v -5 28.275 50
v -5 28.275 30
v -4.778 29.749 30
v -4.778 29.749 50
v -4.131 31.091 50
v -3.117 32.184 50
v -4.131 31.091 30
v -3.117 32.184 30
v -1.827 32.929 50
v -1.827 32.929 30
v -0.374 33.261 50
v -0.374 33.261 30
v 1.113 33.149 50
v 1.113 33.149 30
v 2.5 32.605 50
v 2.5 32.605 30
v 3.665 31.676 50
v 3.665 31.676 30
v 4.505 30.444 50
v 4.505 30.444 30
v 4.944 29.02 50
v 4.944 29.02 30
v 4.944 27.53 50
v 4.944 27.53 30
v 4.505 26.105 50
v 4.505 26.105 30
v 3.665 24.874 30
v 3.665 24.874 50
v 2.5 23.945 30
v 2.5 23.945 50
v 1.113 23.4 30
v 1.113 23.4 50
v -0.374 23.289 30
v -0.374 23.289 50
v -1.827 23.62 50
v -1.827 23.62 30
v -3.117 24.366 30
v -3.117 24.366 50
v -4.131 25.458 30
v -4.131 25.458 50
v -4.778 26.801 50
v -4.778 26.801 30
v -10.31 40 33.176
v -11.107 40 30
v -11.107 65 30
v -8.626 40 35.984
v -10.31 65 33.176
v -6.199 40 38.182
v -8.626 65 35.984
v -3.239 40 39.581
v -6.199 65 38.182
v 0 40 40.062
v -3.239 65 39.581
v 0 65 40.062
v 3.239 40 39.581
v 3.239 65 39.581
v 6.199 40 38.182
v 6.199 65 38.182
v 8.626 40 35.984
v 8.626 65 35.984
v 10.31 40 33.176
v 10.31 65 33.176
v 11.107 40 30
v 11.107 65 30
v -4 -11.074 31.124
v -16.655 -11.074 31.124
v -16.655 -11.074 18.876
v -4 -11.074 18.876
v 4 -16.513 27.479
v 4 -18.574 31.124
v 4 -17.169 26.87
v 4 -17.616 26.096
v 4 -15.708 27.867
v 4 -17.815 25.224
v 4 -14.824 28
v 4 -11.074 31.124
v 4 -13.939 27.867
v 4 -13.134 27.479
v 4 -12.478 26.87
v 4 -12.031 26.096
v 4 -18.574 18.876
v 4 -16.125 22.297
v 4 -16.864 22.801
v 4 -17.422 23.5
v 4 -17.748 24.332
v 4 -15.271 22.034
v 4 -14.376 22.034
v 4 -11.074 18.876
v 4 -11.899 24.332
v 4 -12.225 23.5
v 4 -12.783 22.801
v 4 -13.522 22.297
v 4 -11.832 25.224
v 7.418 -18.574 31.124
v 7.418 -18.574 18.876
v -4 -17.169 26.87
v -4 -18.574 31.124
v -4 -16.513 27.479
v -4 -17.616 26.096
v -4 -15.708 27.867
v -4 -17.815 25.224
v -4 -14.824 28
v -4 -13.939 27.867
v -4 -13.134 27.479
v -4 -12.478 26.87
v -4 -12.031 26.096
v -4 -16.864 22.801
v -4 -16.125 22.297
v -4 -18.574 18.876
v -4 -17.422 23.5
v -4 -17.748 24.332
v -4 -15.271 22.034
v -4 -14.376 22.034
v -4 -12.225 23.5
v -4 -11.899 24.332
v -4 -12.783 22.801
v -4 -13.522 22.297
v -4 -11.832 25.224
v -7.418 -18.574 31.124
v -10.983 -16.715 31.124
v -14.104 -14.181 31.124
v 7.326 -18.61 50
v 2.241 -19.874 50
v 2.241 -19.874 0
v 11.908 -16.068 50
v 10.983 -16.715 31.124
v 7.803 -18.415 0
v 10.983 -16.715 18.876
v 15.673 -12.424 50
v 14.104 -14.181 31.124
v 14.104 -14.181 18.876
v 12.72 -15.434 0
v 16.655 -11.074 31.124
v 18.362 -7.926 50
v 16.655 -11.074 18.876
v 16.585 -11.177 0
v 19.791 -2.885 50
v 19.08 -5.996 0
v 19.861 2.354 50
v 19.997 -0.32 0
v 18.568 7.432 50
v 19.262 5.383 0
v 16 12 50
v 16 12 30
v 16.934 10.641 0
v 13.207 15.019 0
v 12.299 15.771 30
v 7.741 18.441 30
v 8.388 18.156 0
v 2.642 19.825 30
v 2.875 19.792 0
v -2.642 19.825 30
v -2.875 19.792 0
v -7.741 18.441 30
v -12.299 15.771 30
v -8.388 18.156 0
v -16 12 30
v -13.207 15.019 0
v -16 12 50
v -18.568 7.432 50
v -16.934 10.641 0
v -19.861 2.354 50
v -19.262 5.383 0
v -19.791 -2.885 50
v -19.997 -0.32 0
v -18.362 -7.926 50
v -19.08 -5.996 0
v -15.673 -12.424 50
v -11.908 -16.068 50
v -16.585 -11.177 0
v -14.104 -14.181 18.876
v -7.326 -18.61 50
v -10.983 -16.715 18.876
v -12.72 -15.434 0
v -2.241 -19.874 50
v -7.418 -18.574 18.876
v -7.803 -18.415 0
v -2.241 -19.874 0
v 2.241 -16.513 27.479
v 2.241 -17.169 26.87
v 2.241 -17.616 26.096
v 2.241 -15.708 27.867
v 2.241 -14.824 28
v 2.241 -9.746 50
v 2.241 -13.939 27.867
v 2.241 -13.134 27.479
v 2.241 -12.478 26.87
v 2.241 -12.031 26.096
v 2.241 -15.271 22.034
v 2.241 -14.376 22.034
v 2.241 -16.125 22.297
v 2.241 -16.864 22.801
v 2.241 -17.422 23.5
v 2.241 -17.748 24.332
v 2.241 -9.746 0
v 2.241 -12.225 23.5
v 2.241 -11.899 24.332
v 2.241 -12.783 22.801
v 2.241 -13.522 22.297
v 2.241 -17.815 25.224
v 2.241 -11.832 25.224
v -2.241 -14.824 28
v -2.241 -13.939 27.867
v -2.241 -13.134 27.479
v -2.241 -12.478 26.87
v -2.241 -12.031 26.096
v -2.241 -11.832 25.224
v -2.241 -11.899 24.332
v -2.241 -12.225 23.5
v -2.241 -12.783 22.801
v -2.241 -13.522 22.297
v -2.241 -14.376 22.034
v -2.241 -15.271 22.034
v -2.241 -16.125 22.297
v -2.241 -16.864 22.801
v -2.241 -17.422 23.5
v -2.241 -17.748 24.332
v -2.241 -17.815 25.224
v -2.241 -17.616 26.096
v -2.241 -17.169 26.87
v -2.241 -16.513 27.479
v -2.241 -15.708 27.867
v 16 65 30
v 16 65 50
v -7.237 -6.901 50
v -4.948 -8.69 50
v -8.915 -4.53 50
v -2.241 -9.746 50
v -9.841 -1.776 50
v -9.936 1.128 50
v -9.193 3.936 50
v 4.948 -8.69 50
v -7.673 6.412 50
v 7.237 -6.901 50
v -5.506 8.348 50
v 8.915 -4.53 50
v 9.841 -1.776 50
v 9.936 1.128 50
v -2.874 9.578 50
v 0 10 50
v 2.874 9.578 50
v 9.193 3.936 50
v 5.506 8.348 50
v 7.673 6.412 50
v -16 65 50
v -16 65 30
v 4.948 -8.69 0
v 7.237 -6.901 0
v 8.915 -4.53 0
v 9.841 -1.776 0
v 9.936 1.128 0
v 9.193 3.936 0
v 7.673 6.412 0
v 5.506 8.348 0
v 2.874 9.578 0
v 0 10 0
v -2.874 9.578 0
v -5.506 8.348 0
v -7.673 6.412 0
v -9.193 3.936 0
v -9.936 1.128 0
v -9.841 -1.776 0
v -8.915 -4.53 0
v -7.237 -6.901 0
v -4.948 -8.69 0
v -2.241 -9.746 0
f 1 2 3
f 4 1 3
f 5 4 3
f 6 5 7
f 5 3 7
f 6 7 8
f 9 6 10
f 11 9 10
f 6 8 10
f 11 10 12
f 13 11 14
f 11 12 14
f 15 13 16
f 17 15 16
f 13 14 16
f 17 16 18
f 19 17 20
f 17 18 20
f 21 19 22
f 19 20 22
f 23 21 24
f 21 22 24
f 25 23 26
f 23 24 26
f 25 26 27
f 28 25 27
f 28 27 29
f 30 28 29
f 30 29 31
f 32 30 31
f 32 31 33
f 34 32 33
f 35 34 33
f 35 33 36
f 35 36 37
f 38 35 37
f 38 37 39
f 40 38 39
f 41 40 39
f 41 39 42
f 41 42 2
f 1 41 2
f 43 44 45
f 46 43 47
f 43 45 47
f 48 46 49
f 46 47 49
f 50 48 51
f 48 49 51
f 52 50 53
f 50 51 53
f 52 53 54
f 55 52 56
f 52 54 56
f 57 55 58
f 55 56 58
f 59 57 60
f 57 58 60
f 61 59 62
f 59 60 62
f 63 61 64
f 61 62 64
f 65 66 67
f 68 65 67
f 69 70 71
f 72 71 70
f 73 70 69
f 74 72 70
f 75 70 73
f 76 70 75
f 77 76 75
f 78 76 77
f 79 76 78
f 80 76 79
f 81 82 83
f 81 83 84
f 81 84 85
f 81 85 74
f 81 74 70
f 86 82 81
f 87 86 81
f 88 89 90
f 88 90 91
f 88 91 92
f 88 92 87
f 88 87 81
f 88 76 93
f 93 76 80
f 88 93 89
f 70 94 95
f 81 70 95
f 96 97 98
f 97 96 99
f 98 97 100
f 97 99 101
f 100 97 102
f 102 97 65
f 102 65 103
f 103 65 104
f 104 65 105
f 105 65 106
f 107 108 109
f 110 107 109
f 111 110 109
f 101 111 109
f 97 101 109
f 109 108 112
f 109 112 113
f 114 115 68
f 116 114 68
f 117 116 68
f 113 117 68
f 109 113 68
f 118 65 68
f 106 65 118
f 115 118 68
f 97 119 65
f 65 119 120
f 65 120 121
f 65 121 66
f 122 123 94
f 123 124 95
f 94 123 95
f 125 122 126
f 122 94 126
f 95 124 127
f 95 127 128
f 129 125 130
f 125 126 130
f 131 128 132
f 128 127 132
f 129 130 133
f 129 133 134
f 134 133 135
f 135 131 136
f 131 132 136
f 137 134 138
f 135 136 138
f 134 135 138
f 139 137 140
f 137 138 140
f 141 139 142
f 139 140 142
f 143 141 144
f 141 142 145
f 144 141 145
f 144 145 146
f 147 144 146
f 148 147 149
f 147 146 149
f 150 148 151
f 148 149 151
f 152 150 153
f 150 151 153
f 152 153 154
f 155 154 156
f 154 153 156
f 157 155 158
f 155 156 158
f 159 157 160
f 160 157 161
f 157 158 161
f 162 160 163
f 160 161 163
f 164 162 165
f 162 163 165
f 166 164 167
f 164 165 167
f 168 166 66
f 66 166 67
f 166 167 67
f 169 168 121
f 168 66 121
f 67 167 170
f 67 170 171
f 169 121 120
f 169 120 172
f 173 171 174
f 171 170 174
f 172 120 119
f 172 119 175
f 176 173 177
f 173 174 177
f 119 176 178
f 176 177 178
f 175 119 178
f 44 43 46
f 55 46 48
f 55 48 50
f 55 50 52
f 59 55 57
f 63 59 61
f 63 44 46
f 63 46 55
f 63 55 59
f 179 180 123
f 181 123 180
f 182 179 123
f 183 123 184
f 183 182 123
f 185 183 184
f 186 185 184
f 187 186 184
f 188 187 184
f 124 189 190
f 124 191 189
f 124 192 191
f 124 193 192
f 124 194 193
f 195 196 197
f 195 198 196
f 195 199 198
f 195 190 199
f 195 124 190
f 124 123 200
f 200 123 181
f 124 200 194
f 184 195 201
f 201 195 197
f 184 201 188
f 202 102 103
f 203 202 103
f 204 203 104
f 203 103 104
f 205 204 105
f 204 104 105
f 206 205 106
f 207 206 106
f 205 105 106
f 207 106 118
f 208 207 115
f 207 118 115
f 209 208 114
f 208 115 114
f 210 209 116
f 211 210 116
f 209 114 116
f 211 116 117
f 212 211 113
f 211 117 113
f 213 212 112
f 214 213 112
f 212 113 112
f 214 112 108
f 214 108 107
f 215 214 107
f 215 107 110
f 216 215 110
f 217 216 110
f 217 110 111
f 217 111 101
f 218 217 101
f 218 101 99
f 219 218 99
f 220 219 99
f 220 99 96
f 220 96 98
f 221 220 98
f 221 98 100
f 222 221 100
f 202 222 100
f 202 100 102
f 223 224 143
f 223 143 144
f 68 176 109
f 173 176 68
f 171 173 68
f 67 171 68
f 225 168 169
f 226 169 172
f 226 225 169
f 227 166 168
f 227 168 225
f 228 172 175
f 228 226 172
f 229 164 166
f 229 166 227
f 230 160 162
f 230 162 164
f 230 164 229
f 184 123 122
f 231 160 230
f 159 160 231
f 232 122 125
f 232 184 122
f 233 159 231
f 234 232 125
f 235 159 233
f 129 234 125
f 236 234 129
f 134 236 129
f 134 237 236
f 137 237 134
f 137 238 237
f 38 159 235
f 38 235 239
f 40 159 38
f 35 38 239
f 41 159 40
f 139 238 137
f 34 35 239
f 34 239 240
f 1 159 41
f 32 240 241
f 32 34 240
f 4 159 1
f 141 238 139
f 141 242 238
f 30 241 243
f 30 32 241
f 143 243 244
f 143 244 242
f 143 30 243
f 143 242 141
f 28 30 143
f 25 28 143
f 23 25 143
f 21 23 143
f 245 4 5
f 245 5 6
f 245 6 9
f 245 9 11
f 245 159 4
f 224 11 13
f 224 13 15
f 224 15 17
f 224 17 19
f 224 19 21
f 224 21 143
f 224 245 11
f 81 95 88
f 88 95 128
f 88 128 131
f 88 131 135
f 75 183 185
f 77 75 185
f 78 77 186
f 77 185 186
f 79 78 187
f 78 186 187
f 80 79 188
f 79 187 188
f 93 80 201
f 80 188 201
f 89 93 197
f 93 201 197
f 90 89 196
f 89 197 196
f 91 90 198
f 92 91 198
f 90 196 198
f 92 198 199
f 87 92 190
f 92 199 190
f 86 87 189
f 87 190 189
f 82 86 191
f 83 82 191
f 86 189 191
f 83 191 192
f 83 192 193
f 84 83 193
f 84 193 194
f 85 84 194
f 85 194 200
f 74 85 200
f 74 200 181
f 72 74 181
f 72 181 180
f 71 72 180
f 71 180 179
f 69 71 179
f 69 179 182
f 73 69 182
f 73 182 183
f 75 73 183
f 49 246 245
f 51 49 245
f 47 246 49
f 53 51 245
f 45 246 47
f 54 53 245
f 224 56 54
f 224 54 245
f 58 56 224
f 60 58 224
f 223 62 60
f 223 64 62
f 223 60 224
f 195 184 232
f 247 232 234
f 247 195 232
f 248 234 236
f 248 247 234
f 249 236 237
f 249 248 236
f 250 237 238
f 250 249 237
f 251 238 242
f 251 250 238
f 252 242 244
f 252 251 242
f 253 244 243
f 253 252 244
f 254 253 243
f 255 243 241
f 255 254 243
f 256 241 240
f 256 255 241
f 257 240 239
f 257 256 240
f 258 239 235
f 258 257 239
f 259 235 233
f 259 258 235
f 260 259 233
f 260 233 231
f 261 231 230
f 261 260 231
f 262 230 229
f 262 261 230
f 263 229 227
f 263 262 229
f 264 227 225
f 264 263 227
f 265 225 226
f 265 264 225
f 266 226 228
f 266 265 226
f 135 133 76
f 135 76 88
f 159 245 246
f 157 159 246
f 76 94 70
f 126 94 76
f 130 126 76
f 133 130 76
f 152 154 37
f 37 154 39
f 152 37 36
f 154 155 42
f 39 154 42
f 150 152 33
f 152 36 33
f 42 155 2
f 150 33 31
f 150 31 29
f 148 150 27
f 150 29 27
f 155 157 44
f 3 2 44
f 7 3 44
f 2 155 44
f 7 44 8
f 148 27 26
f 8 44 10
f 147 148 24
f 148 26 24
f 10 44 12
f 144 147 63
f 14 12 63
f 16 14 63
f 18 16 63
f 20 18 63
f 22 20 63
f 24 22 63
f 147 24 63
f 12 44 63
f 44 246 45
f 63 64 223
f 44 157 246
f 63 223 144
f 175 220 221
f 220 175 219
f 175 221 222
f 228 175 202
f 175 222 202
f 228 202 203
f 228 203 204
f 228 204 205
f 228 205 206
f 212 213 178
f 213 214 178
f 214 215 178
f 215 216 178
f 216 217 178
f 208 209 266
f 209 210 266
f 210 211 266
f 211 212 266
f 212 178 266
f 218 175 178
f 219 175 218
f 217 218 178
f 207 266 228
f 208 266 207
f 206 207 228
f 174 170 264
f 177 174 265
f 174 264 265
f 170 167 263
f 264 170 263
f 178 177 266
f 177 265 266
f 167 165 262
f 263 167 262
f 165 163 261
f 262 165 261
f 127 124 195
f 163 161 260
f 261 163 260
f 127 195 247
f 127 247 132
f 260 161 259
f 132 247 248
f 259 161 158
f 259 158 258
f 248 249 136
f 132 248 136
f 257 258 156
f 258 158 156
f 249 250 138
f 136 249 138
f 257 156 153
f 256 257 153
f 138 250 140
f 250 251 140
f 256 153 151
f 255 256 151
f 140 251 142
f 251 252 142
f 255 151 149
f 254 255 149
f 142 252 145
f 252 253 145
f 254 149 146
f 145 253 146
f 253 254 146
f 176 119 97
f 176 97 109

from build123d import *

# Parameters (mm, degrees)
SKETCH1_R           = 20
SKETCH1_R_2         = 10
BOSS_EXTRUDE2_DEPTH = 50
BOSS_EXTRUDE3_REACH = 87
SKETCH4_W           = 32
SKETCH4_H           = 20
SKETCH5_R           = 11.161512364
CUT_EXTRUDE1_DEPTH  = 25
SKETCH7_W           = 4.481872956
SKETCH7_H           = 18.163379873
CUT_EXTRUDE2_DEPTH  = 51
SKETCH9_R           = 5
CUT_EXTRUDE3_DEPTH  = 21
CUT_EXTRUDE4_START  = 19
SKETCH10_W          = 12.248004276
SKETCH10_H          = 7.5
CUT_EXTRUDE4_DEPTH  = 15
SKETCH11_R          = 3
CUT_EXTRUDE5_DEPTH  = 25


with BuildPart() as part:
    # Sketch1 → Boss-Extrude2 (new body)
    with BuildSketch(Plane.XY):
        Circle(SKETCH1_R)
        Circle(SKETCH1_R_2, mode=Mode.SUBTRACT)
    extrude(amount=BOSS_EXTRUDE2_DEPTH)

    # Sketch4 → Boss-Extrude3 (add, up to next)
    with BuildSketch(Plane(origin=(0, 65, 0), x_dir=(1, 0, 0), z_dir=(0, 1, 0)), mode=Mode.PRIVATE) as boss_extrude3_sk1:
        with Locations((0, -40)):
            Rectangle(SKETCH4_W, SKETCH4_H)
    boss_extrude3_tool1 = extrude(boss_extrude3_sk1.sketch, amount=-BOSS_EXTRUDE3_REACH, mode=Mode.PRIVATE) - part.part
    add(boss_extrude3_tool1.solids().sort_by_distance((0, 65, 40))[0])

    # Sketch5 → Cut-Extrude1 (cut)
    with BuildSketch(Plane(origin=(0, 65, 0), x_dir=(1, 0, 0), z_dir=(0, 1, 0))):
        with Locations((0, -28.900111213)):
            Circle(SKETCH5_R)
    extrude(amount=-CUT_EXTRUDE1_DEPTH, mode=Mode.SUBTRACT)

    # Sketch7 → Cut-Extrude2 (cut, through all)
    with BuildSketch(Plane(origin=(0, 0, 0), x_dir=(-1, 0, 0), z_dir=(0, 0, -1))):
        with Locations((0, -15.183116037)):
            Rectangle(SKETCH7_W, SKETCH7_H)
    extrude(amount=-CUT_EXTRUDE2_DEPTH, mode=Mode.SUBTRACT)

    # Sketch9 → Cut-Extrude3 (cut, through all)
    with BuildSketch(Plane(origin=(0, 0, 30), x_dir=(-1, 0, 0), z_dir=(0, 0, -1))):
        with Locations((0, 28.274780399)):
            Circle(SKETCH9_R)
    extrude(amount=-CUT_EXTRUDE3_DEPTH, mode=Mode.SUBTRACT)

    # Sketch10 → Cut-Extrude4 (cut)
    with BuildSketch(Plane(origin=(0, 0, 0), x_dir=(0, 0, -1), z_dir=(1, 0, 0)).offset(CUT_EXTRUDE4_START)):
        with Locations((-25, -14.823528739)):
            Rectangle(SKETCH10_W, SKETCH10_H)
    cut_extrude4 = extrude(amount=-CUT_EXTRUDE4_DEPTH, mode=Mode.SUBTRACT)

    # Mirror1: Cut-Extrude4 across plane
    add(cut_extrude4.mirror(Plane(origin=(0, 0, 0), x_dir=(0, 0, 1), z_dir=(1, 0, 0))), mode=Mode.SUBTRACT)

    # Sketch11 → Cut-Extrude5 (cut, through all)
    with BuildSketch(Plane.ZY.offset(4)):
        with Locations((25, -14.823528739)):
            Circle(SKETCH11_R)
    extrude(amount=-CUT_EXTRUDE5_DEPTH, mode=Mode.SUBTRACT)


solid = part.part
